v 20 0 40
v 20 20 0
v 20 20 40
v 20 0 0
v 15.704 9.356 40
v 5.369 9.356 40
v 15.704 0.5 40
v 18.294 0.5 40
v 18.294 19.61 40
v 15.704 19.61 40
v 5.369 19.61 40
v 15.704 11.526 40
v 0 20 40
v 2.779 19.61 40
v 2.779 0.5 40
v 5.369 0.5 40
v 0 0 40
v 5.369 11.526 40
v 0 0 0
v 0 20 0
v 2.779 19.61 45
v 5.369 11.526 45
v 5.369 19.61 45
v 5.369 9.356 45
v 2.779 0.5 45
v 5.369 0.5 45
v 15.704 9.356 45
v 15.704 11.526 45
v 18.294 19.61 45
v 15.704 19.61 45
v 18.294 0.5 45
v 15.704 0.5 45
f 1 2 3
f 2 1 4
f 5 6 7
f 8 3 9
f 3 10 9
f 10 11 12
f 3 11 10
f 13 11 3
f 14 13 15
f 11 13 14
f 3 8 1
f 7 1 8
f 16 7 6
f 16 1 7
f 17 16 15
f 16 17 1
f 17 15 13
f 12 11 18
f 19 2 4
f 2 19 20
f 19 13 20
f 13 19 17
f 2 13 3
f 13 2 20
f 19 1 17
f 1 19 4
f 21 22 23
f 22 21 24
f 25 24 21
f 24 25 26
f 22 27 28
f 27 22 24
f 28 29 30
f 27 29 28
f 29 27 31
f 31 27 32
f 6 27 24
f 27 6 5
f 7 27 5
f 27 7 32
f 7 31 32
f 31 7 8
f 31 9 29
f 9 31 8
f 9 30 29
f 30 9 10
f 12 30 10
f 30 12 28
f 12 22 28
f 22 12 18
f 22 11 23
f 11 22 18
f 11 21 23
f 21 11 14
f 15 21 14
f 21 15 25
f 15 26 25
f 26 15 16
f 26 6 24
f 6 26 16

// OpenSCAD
cube([20, 20, 40]);
translate([0.5, 0.5, 40]){
    linear_extrude(5){
        text("H", size=20);
    }
}
